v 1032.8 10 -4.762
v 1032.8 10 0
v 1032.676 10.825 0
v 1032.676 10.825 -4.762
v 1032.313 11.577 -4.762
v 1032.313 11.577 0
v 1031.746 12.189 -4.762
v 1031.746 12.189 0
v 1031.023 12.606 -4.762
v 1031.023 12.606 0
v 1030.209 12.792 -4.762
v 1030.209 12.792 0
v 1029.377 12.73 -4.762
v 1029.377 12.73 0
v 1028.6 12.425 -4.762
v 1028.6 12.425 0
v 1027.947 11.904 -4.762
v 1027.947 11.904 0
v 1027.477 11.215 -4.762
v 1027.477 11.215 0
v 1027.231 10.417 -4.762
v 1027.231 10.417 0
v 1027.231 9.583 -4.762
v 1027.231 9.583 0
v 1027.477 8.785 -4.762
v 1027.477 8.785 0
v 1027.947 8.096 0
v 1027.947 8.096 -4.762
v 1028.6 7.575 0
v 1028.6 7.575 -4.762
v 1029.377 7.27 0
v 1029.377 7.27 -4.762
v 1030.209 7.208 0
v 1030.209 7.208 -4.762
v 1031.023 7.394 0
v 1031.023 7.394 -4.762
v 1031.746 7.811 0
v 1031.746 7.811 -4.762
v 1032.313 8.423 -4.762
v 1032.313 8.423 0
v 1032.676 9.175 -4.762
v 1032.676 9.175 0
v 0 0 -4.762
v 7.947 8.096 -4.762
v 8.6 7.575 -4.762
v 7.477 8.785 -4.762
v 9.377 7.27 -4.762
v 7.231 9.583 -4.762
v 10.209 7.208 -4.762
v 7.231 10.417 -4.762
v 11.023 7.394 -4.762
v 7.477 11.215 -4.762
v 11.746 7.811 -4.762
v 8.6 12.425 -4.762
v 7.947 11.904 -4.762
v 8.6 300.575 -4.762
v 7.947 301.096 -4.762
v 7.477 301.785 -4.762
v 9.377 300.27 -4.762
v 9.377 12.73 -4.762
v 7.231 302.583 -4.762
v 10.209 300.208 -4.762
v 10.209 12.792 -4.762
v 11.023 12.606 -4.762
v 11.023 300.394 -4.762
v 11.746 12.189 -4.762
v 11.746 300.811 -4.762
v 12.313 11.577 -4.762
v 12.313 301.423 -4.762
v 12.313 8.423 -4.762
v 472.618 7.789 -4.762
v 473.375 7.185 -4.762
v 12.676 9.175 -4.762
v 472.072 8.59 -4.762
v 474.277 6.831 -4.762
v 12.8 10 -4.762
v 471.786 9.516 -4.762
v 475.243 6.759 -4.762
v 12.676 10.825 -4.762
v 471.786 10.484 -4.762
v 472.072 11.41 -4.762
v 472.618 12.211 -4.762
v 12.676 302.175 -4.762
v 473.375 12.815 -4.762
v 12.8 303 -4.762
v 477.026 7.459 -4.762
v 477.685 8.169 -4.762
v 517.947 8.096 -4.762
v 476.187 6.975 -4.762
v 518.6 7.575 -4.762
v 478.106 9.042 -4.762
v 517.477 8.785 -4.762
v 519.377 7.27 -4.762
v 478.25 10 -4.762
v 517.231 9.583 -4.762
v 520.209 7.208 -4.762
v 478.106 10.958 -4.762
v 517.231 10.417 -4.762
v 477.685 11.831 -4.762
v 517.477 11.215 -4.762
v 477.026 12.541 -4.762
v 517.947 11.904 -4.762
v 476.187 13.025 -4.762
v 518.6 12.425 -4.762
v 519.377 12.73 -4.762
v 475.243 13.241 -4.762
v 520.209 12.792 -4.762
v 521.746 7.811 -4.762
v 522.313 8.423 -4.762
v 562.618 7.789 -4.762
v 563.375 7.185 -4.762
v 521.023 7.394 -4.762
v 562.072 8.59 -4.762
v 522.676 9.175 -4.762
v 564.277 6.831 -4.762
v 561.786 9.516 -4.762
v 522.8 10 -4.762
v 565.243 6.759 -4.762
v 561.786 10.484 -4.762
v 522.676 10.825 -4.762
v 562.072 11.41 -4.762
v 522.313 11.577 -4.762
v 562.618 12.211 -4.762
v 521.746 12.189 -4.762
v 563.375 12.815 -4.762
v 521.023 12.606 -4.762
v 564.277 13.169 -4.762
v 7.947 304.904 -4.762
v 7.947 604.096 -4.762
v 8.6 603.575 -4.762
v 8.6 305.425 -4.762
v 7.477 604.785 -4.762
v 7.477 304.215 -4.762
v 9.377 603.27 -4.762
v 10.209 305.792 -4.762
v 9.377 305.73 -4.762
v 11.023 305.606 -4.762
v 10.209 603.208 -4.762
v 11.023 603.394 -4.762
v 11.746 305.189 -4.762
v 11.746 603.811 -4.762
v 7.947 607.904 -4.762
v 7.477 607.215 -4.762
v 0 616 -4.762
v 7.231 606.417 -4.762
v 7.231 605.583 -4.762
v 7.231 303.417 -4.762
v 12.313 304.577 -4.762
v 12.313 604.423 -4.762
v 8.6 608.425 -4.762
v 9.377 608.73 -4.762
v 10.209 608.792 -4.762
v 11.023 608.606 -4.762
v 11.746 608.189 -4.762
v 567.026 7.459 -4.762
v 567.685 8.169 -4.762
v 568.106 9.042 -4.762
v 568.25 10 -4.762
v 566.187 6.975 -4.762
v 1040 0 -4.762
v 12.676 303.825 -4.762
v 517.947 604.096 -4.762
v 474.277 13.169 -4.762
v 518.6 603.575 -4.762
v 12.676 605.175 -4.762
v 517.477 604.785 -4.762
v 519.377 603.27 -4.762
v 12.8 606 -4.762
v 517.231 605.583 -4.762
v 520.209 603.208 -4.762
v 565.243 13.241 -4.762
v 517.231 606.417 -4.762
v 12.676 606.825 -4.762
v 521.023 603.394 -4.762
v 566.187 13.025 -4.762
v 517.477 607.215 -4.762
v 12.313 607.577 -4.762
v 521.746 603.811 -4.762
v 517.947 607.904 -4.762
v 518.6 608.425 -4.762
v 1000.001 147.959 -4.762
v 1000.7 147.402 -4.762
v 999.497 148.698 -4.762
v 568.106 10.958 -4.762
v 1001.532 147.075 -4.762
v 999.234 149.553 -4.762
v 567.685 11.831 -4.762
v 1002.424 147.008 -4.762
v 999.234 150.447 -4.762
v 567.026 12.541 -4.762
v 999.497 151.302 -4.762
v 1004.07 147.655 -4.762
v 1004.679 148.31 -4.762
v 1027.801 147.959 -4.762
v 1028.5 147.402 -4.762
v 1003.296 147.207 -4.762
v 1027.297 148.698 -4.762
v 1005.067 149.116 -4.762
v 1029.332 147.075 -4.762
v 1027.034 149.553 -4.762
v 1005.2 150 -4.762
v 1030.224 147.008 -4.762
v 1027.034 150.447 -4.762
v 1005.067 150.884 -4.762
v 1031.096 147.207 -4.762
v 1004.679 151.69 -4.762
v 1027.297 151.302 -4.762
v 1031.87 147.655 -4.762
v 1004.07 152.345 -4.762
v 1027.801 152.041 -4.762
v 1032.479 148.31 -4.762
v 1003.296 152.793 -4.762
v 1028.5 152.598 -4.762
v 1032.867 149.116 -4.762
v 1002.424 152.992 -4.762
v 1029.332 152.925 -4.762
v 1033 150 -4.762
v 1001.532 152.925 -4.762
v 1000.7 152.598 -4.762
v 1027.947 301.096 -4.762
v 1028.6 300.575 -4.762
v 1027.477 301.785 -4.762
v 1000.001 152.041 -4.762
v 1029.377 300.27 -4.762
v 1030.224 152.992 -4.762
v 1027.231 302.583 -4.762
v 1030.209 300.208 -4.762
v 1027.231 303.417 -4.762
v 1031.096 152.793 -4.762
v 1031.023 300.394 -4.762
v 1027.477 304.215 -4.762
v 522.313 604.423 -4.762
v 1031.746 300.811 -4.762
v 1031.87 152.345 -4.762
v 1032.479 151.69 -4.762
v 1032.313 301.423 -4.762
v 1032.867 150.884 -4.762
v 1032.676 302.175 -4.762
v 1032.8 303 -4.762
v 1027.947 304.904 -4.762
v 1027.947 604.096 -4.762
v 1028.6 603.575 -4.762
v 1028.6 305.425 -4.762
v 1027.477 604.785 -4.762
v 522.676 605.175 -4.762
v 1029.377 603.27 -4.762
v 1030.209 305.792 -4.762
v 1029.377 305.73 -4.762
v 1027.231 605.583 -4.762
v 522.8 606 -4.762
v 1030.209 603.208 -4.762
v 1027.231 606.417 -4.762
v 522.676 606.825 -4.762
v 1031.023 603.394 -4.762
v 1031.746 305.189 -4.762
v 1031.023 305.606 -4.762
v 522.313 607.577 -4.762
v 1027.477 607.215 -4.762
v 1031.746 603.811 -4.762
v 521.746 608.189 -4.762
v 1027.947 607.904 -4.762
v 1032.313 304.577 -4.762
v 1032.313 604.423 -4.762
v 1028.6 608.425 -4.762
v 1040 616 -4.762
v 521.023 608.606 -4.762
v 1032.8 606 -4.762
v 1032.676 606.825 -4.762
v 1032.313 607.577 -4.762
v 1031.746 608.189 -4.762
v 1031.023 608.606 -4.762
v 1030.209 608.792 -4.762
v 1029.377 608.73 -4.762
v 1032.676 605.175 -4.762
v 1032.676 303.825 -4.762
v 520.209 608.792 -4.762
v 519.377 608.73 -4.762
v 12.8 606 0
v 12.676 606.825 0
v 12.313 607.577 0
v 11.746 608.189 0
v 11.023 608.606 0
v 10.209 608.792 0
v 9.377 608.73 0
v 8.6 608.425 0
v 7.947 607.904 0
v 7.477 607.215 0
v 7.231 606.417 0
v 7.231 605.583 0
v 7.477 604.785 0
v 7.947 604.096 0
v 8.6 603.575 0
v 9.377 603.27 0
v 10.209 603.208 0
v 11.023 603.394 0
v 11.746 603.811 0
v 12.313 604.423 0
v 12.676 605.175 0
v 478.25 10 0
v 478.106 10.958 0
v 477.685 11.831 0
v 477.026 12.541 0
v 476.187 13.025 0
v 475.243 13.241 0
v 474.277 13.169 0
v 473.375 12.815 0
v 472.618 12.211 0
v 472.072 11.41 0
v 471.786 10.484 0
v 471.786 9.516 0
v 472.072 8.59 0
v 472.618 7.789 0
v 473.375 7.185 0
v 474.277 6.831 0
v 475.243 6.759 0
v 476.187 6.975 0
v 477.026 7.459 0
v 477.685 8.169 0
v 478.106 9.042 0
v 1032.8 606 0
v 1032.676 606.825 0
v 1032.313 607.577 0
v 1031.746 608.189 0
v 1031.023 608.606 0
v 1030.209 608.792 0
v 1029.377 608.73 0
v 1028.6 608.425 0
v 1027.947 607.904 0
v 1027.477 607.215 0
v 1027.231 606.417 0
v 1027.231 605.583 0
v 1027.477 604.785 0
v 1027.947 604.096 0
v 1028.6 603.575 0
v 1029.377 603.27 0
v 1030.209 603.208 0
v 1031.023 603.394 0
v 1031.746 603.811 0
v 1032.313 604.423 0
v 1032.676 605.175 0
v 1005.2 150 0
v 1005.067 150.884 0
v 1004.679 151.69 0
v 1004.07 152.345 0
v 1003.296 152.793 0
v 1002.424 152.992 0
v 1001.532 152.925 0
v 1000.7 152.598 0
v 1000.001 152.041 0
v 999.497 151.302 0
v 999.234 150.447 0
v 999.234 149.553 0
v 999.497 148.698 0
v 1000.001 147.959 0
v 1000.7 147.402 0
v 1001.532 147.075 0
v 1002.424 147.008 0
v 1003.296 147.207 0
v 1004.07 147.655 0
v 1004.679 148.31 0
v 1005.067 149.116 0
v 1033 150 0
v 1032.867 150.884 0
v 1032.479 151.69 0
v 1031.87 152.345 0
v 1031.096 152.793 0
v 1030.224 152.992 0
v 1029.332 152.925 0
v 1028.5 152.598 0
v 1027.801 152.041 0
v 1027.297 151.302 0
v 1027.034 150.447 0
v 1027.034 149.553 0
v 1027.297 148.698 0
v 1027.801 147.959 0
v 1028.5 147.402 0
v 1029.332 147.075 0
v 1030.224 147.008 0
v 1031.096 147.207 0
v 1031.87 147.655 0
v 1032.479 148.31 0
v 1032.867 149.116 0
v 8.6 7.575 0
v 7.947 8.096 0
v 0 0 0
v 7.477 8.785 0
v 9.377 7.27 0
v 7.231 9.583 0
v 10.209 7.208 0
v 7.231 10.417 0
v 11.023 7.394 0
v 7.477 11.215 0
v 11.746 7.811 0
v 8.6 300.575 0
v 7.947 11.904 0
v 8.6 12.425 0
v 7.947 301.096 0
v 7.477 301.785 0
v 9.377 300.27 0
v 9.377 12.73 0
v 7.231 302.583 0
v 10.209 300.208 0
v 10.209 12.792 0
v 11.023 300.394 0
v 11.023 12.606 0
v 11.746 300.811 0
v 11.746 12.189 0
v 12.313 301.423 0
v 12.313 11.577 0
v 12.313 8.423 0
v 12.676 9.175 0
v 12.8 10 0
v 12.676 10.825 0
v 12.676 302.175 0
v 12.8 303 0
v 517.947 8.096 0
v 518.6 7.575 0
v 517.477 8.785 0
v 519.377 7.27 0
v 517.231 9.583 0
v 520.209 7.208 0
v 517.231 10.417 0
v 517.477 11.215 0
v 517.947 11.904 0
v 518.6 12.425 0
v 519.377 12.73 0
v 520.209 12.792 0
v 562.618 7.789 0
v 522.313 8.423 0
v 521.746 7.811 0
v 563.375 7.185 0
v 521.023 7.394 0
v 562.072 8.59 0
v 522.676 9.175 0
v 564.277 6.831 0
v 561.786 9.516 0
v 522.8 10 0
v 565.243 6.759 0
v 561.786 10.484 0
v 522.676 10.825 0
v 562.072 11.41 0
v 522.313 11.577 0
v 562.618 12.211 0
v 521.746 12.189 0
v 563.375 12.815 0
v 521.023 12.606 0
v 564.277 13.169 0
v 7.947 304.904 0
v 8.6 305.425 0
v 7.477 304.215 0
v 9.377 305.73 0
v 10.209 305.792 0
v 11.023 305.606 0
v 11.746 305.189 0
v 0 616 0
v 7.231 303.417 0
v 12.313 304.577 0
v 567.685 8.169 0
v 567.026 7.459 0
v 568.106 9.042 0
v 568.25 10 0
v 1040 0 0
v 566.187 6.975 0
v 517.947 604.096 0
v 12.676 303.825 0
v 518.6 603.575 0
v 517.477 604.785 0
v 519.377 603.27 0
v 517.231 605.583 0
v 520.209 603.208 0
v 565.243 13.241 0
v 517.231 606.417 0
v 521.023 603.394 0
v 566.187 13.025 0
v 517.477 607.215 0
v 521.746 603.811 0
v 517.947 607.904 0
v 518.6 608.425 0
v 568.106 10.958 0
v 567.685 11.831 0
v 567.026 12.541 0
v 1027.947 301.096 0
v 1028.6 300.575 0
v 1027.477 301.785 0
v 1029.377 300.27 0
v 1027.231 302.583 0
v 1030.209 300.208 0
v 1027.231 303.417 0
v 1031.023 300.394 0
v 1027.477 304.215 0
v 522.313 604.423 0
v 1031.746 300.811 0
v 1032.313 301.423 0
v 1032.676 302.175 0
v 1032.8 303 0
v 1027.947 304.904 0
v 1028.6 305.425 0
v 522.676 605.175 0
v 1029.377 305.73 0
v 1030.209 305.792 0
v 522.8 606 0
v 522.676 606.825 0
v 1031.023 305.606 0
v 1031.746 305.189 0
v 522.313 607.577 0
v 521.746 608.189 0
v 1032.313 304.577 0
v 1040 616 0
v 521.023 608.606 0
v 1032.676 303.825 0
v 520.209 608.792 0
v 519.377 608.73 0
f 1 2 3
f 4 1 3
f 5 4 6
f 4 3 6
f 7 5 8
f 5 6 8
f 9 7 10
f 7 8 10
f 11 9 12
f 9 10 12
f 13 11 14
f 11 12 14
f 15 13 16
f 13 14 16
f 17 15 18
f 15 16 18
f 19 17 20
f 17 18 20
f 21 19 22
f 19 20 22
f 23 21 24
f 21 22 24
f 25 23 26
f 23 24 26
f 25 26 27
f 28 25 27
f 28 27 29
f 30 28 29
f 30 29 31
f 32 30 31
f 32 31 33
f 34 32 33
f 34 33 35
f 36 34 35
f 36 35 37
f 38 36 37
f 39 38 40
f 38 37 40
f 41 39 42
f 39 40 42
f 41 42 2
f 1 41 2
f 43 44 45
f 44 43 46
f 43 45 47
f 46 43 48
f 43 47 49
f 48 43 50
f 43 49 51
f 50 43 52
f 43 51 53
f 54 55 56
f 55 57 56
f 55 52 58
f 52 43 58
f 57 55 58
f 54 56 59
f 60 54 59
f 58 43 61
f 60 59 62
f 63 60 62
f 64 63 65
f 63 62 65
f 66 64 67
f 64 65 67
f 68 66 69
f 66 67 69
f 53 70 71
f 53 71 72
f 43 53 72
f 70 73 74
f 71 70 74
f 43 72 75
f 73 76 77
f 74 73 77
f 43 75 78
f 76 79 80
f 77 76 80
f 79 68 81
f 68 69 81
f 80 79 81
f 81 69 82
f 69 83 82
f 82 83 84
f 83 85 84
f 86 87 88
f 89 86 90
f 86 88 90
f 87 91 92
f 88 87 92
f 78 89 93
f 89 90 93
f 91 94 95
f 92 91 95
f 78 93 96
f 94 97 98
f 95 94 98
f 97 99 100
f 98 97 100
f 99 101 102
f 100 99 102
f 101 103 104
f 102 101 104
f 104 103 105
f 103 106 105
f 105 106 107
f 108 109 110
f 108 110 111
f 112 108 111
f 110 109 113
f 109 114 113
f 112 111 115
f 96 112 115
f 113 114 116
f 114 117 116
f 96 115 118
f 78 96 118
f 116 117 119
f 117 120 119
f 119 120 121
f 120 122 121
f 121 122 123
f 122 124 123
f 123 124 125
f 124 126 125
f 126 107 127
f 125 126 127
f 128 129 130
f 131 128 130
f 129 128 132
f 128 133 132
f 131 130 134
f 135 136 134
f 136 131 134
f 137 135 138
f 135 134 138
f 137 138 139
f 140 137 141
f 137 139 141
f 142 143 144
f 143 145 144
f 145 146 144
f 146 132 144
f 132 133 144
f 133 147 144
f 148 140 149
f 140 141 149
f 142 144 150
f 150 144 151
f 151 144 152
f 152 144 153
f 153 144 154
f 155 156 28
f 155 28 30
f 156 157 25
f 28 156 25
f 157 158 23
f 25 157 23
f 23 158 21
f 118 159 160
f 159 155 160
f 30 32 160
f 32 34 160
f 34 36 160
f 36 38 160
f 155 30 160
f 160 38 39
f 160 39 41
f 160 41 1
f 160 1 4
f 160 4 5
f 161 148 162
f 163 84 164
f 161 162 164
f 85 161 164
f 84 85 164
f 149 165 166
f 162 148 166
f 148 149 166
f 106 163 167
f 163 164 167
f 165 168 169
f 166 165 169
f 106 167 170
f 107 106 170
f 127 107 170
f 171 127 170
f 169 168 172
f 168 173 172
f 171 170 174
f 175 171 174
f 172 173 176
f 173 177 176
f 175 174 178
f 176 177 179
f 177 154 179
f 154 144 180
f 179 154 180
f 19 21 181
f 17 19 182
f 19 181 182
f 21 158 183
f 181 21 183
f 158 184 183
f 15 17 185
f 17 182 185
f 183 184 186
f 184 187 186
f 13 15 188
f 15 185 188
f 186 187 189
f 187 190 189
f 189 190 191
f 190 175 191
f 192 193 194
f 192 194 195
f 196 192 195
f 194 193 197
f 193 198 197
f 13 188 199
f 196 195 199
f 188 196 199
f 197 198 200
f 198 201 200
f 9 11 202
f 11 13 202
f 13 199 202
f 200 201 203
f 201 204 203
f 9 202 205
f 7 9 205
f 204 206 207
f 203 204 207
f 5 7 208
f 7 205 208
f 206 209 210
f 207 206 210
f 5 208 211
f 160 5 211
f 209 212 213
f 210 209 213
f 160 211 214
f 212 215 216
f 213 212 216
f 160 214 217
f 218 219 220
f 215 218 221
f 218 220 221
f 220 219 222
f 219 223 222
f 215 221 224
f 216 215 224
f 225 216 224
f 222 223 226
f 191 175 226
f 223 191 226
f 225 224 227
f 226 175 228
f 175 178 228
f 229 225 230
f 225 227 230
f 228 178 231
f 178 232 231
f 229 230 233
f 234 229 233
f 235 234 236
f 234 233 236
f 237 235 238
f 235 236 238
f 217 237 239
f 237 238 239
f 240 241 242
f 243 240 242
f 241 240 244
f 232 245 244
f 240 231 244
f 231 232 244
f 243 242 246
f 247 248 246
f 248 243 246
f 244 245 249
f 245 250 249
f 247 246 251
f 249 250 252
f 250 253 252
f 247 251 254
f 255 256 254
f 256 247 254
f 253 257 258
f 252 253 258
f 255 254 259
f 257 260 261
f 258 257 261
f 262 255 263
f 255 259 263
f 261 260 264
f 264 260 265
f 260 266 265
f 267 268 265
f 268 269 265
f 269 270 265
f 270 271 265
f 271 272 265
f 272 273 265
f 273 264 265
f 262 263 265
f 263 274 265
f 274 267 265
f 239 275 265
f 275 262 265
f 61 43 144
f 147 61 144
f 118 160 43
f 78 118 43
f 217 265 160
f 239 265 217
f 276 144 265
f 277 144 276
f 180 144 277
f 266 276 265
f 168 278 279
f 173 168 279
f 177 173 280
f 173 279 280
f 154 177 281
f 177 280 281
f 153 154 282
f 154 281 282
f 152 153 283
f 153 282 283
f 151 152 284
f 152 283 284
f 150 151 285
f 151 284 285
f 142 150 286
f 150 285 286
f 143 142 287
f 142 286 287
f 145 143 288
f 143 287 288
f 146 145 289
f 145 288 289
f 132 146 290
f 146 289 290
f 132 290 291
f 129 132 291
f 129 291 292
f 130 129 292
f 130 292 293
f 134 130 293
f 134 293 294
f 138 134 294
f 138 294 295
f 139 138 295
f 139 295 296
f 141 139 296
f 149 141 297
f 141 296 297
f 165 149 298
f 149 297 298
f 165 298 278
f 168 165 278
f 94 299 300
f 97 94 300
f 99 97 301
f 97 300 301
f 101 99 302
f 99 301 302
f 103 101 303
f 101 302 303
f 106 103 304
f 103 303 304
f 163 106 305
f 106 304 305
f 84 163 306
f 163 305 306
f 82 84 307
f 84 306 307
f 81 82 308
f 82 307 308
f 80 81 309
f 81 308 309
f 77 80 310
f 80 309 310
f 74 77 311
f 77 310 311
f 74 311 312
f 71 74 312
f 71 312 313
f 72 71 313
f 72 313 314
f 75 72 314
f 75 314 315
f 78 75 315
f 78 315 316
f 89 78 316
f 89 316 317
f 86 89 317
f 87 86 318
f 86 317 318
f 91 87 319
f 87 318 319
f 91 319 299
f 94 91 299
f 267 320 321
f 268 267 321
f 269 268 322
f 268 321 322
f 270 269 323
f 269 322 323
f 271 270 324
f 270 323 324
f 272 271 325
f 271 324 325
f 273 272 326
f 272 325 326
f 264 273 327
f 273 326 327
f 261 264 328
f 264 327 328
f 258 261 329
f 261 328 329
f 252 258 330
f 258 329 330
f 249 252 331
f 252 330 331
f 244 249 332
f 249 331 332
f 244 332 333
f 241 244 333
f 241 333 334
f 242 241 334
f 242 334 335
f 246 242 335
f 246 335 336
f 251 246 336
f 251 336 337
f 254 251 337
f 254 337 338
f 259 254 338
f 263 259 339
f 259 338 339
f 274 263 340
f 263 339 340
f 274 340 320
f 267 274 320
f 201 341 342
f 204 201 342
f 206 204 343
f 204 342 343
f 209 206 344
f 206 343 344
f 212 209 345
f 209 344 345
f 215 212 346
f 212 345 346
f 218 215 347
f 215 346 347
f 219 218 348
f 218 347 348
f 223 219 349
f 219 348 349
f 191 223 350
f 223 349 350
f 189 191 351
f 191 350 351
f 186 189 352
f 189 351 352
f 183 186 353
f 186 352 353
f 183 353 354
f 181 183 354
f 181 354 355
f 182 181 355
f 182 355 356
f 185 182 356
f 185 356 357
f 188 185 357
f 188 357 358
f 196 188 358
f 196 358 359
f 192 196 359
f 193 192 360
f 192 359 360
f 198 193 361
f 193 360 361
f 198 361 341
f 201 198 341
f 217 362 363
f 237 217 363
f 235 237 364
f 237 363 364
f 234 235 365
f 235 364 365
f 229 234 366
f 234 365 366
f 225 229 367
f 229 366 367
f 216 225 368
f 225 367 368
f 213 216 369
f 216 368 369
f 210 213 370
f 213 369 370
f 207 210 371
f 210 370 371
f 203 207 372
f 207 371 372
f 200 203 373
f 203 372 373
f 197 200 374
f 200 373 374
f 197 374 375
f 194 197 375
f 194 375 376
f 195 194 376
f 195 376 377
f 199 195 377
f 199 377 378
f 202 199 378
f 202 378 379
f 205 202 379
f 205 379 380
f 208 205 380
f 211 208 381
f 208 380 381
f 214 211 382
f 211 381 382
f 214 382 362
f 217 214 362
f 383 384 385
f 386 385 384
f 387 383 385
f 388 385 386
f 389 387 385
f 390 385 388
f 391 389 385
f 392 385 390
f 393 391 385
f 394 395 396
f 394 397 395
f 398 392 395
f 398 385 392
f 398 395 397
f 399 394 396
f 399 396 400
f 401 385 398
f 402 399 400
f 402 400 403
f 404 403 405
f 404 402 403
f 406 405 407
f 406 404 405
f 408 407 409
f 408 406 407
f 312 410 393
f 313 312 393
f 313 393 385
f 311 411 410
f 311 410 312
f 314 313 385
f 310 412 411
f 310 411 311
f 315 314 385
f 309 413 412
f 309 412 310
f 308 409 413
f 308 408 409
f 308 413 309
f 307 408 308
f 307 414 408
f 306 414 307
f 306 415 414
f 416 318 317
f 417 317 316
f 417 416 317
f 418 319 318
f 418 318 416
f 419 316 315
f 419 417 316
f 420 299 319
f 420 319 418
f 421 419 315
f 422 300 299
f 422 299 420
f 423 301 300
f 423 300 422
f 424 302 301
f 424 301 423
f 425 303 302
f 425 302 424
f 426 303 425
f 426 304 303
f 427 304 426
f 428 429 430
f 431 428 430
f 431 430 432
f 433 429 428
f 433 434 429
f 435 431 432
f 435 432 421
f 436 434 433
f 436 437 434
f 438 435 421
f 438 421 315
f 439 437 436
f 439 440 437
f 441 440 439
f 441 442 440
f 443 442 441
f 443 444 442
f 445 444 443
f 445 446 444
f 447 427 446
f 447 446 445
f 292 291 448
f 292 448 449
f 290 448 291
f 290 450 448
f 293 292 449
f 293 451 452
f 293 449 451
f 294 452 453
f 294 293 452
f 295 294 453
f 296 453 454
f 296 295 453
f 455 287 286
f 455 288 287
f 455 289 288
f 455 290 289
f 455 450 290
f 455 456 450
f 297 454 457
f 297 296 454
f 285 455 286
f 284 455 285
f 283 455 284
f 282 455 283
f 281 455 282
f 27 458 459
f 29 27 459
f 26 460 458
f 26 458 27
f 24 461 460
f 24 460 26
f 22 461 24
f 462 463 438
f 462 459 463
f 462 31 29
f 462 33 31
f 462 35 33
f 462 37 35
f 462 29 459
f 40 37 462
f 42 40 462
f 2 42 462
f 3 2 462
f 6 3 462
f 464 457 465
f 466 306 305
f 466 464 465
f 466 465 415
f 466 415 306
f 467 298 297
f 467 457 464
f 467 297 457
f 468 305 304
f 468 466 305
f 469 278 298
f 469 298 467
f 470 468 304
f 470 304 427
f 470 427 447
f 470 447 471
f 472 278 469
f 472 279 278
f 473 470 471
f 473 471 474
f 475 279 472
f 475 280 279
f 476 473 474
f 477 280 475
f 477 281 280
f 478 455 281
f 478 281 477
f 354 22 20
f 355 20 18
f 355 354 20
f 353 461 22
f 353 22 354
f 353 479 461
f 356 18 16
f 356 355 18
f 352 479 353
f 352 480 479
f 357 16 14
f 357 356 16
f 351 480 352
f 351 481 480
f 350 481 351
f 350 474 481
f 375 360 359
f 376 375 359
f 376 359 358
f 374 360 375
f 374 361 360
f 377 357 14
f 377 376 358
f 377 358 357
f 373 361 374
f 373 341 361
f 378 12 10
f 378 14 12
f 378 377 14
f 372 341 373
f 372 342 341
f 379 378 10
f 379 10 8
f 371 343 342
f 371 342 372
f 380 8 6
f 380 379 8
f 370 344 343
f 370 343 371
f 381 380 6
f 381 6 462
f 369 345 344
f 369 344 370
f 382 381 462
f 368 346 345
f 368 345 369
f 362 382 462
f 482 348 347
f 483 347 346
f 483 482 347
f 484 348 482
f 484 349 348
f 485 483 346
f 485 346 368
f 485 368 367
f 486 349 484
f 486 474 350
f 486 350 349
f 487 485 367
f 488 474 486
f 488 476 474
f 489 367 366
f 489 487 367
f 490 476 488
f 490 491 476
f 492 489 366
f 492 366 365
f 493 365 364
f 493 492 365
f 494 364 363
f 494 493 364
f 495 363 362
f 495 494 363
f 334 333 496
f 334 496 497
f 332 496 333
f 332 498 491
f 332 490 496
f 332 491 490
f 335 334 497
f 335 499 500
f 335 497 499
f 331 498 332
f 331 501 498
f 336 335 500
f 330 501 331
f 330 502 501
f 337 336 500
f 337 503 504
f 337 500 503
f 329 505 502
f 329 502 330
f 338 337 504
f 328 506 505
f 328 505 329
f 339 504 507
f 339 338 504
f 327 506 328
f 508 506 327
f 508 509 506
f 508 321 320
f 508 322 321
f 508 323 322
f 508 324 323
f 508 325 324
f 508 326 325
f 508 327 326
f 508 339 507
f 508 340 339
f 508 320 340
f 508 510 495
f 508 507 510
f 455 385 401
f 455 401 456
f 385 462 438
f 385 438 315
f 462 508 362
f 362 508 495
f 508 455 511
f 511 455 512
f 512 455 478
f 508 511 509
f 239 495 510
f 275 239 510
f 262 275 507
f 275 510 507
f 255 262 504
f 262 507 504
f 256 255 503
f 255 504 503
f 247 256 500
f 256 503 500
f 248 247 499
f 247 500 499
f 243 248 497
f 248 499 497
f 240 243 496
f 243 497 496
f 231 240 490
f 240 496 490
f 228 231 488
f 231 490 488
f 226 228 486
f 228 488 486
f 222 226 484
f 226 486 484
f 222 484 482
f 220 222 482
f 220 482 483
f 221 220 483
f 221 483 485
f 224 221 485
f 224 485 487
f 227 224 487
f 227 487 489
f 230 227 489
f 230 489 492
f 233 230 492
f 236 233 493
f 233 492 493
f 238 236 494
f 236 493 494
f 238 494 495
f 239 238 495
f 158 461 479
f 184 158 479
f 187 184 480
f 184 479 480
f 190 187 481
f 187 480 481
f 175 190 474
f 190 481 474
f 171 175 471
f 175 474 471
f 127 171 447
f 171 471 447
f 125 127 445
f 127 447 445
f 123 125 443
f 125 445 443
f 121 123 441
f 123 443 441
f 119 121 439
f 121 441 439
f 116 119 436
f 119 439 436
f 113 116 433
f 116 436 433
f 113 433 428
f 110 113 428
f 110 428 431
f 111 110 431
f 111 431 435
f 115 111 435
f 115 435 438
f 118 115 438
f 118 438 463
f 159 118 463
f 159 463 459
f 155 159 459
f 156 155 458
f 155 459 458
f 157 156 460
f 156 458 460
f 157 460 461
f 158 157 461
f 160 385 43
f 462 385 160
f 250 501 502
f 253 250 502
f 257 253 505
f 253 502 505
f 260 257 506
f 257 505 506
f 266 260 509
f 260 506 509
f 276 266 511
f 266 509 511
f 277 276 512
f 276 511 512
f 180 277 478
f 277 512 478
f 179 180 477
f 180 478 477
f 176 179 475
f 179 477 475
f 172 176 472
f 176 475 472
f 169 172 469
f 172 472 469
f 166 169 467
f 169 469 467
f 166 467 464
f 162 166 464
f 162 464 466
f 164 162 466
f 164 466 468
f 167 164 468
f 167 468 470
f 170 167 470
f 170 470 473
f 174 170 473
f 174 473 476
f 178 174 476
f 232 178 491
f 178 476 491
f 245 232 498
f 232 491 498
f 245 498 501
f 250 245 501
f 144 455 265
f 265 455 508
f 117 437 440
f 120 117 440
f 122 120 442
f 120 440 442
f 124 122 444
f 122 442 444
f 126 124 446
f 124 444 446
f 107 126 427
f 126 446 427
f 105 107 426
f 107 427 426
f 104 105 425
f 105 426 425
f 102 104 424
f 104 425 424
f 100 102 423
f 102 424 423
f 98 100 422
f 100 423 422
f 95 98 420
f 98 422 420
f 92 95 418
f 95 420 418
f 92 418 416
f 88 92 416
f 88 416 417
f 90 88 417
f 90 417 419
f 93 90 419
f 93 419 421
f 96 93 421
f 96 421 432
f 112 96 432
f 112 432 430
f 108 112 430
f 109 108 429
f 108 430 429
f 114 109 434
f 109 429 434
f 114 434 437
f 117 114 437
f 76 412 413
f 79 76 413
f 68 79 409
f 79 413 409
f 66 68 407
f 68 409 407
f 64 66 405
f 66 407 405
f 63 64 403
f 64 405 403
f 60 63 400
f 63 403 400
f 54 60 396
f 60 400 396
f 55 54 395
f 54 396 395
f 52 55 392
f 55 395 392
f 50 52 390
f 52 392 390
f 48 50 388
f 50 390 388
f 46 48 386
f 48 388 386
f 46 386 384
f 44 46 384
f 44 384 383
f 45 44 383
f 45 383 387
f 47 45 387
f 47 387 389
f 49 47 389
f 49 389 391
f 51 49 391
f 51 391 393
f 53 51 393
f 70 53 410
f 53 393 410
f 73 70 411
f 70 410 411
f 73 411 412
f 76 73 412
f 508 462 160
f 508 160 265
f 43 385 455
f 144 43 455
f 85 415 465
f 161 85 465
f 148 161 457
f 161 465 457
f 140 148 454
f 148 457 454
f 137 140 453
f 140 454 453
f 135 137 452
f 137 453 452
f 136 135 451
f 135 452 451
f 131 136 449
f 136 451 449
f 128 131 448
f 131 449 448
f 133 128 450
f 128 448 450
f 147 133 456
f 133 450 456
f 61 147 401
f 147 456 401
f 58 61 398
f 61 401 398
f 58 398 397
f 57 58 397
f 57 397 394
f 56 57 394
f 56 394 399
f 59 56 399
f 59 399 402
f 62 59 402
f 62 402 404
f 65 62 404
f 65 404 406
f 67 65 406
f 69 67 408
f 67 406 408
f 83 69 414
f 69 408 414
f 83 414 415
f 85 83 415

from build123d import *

# Parameters (mm, degrees)
SKETCH1_W           = 1040
SKETCH1_H           = 616
SKETCH1_R           = 2.8
SKETCH1_R_2         = 3.25
SKETCH1_R_3         = 3
BOSS_EXTRUDE1_DEPTH = 4.7625


with BuildPart() as part:
    # Sketch1 → Boss-Extrude1 (new body)
    with BuildSketch(Plane.XY):
        with Locations((520, 308)):
            Rectangle(SKETCH1_W, SKETCH1_H)
        with Locations((10, 606)):
            Circle(SKETCH1_R, mode=Mode.SUBTRACT)
        with Locations((520, 606)):
            Circle(SKETCH1_R, mode=Mode.SUBTRACT)
        with Locations((1030, 606)):
            Circle(SKETCH1_R, mode=Mode.SUBTRACT)
        with Locations((10, 303)):
            Circle(SKETCH1_R, mode=Mode.SUBTRACT)
        with Locations((10, 10)):
            Circle(SKETCH1_R, mode=Mode.SUBTRACT)
        with Locations((520, 10)):
            Circle(SKETCH1_R, mode=Mode.SUBTRACT)
        with Locations((1030, 10)):
            Circle(SKETCH1_R, mode=Mode.SUBTRACT)
        with Locations((1030, 303)):
            Circle(SKETCH1_R, mode=Mode.SUBTRACT)
        with Locations((475, 10)):
            Circle(SKETCH1_R_2, mode=Mode.SUBTRACT)
        with Locations((565, 10)):
            Circle(SKETCH1_R_2, mode=Mode.SUBTRACT)
        with Locations((1030, 150)):
            Circle(SKETCH1_R_3, mode=Mode.SUBTRACT)
        with Locations((1002.2, 150)):
            Circle(SKETCH1_R_3, mode=Mode.SUBTRACT)
    extrude(amount=-BOSS_EXTRUDE1_DEPTH)


solid = part.part
